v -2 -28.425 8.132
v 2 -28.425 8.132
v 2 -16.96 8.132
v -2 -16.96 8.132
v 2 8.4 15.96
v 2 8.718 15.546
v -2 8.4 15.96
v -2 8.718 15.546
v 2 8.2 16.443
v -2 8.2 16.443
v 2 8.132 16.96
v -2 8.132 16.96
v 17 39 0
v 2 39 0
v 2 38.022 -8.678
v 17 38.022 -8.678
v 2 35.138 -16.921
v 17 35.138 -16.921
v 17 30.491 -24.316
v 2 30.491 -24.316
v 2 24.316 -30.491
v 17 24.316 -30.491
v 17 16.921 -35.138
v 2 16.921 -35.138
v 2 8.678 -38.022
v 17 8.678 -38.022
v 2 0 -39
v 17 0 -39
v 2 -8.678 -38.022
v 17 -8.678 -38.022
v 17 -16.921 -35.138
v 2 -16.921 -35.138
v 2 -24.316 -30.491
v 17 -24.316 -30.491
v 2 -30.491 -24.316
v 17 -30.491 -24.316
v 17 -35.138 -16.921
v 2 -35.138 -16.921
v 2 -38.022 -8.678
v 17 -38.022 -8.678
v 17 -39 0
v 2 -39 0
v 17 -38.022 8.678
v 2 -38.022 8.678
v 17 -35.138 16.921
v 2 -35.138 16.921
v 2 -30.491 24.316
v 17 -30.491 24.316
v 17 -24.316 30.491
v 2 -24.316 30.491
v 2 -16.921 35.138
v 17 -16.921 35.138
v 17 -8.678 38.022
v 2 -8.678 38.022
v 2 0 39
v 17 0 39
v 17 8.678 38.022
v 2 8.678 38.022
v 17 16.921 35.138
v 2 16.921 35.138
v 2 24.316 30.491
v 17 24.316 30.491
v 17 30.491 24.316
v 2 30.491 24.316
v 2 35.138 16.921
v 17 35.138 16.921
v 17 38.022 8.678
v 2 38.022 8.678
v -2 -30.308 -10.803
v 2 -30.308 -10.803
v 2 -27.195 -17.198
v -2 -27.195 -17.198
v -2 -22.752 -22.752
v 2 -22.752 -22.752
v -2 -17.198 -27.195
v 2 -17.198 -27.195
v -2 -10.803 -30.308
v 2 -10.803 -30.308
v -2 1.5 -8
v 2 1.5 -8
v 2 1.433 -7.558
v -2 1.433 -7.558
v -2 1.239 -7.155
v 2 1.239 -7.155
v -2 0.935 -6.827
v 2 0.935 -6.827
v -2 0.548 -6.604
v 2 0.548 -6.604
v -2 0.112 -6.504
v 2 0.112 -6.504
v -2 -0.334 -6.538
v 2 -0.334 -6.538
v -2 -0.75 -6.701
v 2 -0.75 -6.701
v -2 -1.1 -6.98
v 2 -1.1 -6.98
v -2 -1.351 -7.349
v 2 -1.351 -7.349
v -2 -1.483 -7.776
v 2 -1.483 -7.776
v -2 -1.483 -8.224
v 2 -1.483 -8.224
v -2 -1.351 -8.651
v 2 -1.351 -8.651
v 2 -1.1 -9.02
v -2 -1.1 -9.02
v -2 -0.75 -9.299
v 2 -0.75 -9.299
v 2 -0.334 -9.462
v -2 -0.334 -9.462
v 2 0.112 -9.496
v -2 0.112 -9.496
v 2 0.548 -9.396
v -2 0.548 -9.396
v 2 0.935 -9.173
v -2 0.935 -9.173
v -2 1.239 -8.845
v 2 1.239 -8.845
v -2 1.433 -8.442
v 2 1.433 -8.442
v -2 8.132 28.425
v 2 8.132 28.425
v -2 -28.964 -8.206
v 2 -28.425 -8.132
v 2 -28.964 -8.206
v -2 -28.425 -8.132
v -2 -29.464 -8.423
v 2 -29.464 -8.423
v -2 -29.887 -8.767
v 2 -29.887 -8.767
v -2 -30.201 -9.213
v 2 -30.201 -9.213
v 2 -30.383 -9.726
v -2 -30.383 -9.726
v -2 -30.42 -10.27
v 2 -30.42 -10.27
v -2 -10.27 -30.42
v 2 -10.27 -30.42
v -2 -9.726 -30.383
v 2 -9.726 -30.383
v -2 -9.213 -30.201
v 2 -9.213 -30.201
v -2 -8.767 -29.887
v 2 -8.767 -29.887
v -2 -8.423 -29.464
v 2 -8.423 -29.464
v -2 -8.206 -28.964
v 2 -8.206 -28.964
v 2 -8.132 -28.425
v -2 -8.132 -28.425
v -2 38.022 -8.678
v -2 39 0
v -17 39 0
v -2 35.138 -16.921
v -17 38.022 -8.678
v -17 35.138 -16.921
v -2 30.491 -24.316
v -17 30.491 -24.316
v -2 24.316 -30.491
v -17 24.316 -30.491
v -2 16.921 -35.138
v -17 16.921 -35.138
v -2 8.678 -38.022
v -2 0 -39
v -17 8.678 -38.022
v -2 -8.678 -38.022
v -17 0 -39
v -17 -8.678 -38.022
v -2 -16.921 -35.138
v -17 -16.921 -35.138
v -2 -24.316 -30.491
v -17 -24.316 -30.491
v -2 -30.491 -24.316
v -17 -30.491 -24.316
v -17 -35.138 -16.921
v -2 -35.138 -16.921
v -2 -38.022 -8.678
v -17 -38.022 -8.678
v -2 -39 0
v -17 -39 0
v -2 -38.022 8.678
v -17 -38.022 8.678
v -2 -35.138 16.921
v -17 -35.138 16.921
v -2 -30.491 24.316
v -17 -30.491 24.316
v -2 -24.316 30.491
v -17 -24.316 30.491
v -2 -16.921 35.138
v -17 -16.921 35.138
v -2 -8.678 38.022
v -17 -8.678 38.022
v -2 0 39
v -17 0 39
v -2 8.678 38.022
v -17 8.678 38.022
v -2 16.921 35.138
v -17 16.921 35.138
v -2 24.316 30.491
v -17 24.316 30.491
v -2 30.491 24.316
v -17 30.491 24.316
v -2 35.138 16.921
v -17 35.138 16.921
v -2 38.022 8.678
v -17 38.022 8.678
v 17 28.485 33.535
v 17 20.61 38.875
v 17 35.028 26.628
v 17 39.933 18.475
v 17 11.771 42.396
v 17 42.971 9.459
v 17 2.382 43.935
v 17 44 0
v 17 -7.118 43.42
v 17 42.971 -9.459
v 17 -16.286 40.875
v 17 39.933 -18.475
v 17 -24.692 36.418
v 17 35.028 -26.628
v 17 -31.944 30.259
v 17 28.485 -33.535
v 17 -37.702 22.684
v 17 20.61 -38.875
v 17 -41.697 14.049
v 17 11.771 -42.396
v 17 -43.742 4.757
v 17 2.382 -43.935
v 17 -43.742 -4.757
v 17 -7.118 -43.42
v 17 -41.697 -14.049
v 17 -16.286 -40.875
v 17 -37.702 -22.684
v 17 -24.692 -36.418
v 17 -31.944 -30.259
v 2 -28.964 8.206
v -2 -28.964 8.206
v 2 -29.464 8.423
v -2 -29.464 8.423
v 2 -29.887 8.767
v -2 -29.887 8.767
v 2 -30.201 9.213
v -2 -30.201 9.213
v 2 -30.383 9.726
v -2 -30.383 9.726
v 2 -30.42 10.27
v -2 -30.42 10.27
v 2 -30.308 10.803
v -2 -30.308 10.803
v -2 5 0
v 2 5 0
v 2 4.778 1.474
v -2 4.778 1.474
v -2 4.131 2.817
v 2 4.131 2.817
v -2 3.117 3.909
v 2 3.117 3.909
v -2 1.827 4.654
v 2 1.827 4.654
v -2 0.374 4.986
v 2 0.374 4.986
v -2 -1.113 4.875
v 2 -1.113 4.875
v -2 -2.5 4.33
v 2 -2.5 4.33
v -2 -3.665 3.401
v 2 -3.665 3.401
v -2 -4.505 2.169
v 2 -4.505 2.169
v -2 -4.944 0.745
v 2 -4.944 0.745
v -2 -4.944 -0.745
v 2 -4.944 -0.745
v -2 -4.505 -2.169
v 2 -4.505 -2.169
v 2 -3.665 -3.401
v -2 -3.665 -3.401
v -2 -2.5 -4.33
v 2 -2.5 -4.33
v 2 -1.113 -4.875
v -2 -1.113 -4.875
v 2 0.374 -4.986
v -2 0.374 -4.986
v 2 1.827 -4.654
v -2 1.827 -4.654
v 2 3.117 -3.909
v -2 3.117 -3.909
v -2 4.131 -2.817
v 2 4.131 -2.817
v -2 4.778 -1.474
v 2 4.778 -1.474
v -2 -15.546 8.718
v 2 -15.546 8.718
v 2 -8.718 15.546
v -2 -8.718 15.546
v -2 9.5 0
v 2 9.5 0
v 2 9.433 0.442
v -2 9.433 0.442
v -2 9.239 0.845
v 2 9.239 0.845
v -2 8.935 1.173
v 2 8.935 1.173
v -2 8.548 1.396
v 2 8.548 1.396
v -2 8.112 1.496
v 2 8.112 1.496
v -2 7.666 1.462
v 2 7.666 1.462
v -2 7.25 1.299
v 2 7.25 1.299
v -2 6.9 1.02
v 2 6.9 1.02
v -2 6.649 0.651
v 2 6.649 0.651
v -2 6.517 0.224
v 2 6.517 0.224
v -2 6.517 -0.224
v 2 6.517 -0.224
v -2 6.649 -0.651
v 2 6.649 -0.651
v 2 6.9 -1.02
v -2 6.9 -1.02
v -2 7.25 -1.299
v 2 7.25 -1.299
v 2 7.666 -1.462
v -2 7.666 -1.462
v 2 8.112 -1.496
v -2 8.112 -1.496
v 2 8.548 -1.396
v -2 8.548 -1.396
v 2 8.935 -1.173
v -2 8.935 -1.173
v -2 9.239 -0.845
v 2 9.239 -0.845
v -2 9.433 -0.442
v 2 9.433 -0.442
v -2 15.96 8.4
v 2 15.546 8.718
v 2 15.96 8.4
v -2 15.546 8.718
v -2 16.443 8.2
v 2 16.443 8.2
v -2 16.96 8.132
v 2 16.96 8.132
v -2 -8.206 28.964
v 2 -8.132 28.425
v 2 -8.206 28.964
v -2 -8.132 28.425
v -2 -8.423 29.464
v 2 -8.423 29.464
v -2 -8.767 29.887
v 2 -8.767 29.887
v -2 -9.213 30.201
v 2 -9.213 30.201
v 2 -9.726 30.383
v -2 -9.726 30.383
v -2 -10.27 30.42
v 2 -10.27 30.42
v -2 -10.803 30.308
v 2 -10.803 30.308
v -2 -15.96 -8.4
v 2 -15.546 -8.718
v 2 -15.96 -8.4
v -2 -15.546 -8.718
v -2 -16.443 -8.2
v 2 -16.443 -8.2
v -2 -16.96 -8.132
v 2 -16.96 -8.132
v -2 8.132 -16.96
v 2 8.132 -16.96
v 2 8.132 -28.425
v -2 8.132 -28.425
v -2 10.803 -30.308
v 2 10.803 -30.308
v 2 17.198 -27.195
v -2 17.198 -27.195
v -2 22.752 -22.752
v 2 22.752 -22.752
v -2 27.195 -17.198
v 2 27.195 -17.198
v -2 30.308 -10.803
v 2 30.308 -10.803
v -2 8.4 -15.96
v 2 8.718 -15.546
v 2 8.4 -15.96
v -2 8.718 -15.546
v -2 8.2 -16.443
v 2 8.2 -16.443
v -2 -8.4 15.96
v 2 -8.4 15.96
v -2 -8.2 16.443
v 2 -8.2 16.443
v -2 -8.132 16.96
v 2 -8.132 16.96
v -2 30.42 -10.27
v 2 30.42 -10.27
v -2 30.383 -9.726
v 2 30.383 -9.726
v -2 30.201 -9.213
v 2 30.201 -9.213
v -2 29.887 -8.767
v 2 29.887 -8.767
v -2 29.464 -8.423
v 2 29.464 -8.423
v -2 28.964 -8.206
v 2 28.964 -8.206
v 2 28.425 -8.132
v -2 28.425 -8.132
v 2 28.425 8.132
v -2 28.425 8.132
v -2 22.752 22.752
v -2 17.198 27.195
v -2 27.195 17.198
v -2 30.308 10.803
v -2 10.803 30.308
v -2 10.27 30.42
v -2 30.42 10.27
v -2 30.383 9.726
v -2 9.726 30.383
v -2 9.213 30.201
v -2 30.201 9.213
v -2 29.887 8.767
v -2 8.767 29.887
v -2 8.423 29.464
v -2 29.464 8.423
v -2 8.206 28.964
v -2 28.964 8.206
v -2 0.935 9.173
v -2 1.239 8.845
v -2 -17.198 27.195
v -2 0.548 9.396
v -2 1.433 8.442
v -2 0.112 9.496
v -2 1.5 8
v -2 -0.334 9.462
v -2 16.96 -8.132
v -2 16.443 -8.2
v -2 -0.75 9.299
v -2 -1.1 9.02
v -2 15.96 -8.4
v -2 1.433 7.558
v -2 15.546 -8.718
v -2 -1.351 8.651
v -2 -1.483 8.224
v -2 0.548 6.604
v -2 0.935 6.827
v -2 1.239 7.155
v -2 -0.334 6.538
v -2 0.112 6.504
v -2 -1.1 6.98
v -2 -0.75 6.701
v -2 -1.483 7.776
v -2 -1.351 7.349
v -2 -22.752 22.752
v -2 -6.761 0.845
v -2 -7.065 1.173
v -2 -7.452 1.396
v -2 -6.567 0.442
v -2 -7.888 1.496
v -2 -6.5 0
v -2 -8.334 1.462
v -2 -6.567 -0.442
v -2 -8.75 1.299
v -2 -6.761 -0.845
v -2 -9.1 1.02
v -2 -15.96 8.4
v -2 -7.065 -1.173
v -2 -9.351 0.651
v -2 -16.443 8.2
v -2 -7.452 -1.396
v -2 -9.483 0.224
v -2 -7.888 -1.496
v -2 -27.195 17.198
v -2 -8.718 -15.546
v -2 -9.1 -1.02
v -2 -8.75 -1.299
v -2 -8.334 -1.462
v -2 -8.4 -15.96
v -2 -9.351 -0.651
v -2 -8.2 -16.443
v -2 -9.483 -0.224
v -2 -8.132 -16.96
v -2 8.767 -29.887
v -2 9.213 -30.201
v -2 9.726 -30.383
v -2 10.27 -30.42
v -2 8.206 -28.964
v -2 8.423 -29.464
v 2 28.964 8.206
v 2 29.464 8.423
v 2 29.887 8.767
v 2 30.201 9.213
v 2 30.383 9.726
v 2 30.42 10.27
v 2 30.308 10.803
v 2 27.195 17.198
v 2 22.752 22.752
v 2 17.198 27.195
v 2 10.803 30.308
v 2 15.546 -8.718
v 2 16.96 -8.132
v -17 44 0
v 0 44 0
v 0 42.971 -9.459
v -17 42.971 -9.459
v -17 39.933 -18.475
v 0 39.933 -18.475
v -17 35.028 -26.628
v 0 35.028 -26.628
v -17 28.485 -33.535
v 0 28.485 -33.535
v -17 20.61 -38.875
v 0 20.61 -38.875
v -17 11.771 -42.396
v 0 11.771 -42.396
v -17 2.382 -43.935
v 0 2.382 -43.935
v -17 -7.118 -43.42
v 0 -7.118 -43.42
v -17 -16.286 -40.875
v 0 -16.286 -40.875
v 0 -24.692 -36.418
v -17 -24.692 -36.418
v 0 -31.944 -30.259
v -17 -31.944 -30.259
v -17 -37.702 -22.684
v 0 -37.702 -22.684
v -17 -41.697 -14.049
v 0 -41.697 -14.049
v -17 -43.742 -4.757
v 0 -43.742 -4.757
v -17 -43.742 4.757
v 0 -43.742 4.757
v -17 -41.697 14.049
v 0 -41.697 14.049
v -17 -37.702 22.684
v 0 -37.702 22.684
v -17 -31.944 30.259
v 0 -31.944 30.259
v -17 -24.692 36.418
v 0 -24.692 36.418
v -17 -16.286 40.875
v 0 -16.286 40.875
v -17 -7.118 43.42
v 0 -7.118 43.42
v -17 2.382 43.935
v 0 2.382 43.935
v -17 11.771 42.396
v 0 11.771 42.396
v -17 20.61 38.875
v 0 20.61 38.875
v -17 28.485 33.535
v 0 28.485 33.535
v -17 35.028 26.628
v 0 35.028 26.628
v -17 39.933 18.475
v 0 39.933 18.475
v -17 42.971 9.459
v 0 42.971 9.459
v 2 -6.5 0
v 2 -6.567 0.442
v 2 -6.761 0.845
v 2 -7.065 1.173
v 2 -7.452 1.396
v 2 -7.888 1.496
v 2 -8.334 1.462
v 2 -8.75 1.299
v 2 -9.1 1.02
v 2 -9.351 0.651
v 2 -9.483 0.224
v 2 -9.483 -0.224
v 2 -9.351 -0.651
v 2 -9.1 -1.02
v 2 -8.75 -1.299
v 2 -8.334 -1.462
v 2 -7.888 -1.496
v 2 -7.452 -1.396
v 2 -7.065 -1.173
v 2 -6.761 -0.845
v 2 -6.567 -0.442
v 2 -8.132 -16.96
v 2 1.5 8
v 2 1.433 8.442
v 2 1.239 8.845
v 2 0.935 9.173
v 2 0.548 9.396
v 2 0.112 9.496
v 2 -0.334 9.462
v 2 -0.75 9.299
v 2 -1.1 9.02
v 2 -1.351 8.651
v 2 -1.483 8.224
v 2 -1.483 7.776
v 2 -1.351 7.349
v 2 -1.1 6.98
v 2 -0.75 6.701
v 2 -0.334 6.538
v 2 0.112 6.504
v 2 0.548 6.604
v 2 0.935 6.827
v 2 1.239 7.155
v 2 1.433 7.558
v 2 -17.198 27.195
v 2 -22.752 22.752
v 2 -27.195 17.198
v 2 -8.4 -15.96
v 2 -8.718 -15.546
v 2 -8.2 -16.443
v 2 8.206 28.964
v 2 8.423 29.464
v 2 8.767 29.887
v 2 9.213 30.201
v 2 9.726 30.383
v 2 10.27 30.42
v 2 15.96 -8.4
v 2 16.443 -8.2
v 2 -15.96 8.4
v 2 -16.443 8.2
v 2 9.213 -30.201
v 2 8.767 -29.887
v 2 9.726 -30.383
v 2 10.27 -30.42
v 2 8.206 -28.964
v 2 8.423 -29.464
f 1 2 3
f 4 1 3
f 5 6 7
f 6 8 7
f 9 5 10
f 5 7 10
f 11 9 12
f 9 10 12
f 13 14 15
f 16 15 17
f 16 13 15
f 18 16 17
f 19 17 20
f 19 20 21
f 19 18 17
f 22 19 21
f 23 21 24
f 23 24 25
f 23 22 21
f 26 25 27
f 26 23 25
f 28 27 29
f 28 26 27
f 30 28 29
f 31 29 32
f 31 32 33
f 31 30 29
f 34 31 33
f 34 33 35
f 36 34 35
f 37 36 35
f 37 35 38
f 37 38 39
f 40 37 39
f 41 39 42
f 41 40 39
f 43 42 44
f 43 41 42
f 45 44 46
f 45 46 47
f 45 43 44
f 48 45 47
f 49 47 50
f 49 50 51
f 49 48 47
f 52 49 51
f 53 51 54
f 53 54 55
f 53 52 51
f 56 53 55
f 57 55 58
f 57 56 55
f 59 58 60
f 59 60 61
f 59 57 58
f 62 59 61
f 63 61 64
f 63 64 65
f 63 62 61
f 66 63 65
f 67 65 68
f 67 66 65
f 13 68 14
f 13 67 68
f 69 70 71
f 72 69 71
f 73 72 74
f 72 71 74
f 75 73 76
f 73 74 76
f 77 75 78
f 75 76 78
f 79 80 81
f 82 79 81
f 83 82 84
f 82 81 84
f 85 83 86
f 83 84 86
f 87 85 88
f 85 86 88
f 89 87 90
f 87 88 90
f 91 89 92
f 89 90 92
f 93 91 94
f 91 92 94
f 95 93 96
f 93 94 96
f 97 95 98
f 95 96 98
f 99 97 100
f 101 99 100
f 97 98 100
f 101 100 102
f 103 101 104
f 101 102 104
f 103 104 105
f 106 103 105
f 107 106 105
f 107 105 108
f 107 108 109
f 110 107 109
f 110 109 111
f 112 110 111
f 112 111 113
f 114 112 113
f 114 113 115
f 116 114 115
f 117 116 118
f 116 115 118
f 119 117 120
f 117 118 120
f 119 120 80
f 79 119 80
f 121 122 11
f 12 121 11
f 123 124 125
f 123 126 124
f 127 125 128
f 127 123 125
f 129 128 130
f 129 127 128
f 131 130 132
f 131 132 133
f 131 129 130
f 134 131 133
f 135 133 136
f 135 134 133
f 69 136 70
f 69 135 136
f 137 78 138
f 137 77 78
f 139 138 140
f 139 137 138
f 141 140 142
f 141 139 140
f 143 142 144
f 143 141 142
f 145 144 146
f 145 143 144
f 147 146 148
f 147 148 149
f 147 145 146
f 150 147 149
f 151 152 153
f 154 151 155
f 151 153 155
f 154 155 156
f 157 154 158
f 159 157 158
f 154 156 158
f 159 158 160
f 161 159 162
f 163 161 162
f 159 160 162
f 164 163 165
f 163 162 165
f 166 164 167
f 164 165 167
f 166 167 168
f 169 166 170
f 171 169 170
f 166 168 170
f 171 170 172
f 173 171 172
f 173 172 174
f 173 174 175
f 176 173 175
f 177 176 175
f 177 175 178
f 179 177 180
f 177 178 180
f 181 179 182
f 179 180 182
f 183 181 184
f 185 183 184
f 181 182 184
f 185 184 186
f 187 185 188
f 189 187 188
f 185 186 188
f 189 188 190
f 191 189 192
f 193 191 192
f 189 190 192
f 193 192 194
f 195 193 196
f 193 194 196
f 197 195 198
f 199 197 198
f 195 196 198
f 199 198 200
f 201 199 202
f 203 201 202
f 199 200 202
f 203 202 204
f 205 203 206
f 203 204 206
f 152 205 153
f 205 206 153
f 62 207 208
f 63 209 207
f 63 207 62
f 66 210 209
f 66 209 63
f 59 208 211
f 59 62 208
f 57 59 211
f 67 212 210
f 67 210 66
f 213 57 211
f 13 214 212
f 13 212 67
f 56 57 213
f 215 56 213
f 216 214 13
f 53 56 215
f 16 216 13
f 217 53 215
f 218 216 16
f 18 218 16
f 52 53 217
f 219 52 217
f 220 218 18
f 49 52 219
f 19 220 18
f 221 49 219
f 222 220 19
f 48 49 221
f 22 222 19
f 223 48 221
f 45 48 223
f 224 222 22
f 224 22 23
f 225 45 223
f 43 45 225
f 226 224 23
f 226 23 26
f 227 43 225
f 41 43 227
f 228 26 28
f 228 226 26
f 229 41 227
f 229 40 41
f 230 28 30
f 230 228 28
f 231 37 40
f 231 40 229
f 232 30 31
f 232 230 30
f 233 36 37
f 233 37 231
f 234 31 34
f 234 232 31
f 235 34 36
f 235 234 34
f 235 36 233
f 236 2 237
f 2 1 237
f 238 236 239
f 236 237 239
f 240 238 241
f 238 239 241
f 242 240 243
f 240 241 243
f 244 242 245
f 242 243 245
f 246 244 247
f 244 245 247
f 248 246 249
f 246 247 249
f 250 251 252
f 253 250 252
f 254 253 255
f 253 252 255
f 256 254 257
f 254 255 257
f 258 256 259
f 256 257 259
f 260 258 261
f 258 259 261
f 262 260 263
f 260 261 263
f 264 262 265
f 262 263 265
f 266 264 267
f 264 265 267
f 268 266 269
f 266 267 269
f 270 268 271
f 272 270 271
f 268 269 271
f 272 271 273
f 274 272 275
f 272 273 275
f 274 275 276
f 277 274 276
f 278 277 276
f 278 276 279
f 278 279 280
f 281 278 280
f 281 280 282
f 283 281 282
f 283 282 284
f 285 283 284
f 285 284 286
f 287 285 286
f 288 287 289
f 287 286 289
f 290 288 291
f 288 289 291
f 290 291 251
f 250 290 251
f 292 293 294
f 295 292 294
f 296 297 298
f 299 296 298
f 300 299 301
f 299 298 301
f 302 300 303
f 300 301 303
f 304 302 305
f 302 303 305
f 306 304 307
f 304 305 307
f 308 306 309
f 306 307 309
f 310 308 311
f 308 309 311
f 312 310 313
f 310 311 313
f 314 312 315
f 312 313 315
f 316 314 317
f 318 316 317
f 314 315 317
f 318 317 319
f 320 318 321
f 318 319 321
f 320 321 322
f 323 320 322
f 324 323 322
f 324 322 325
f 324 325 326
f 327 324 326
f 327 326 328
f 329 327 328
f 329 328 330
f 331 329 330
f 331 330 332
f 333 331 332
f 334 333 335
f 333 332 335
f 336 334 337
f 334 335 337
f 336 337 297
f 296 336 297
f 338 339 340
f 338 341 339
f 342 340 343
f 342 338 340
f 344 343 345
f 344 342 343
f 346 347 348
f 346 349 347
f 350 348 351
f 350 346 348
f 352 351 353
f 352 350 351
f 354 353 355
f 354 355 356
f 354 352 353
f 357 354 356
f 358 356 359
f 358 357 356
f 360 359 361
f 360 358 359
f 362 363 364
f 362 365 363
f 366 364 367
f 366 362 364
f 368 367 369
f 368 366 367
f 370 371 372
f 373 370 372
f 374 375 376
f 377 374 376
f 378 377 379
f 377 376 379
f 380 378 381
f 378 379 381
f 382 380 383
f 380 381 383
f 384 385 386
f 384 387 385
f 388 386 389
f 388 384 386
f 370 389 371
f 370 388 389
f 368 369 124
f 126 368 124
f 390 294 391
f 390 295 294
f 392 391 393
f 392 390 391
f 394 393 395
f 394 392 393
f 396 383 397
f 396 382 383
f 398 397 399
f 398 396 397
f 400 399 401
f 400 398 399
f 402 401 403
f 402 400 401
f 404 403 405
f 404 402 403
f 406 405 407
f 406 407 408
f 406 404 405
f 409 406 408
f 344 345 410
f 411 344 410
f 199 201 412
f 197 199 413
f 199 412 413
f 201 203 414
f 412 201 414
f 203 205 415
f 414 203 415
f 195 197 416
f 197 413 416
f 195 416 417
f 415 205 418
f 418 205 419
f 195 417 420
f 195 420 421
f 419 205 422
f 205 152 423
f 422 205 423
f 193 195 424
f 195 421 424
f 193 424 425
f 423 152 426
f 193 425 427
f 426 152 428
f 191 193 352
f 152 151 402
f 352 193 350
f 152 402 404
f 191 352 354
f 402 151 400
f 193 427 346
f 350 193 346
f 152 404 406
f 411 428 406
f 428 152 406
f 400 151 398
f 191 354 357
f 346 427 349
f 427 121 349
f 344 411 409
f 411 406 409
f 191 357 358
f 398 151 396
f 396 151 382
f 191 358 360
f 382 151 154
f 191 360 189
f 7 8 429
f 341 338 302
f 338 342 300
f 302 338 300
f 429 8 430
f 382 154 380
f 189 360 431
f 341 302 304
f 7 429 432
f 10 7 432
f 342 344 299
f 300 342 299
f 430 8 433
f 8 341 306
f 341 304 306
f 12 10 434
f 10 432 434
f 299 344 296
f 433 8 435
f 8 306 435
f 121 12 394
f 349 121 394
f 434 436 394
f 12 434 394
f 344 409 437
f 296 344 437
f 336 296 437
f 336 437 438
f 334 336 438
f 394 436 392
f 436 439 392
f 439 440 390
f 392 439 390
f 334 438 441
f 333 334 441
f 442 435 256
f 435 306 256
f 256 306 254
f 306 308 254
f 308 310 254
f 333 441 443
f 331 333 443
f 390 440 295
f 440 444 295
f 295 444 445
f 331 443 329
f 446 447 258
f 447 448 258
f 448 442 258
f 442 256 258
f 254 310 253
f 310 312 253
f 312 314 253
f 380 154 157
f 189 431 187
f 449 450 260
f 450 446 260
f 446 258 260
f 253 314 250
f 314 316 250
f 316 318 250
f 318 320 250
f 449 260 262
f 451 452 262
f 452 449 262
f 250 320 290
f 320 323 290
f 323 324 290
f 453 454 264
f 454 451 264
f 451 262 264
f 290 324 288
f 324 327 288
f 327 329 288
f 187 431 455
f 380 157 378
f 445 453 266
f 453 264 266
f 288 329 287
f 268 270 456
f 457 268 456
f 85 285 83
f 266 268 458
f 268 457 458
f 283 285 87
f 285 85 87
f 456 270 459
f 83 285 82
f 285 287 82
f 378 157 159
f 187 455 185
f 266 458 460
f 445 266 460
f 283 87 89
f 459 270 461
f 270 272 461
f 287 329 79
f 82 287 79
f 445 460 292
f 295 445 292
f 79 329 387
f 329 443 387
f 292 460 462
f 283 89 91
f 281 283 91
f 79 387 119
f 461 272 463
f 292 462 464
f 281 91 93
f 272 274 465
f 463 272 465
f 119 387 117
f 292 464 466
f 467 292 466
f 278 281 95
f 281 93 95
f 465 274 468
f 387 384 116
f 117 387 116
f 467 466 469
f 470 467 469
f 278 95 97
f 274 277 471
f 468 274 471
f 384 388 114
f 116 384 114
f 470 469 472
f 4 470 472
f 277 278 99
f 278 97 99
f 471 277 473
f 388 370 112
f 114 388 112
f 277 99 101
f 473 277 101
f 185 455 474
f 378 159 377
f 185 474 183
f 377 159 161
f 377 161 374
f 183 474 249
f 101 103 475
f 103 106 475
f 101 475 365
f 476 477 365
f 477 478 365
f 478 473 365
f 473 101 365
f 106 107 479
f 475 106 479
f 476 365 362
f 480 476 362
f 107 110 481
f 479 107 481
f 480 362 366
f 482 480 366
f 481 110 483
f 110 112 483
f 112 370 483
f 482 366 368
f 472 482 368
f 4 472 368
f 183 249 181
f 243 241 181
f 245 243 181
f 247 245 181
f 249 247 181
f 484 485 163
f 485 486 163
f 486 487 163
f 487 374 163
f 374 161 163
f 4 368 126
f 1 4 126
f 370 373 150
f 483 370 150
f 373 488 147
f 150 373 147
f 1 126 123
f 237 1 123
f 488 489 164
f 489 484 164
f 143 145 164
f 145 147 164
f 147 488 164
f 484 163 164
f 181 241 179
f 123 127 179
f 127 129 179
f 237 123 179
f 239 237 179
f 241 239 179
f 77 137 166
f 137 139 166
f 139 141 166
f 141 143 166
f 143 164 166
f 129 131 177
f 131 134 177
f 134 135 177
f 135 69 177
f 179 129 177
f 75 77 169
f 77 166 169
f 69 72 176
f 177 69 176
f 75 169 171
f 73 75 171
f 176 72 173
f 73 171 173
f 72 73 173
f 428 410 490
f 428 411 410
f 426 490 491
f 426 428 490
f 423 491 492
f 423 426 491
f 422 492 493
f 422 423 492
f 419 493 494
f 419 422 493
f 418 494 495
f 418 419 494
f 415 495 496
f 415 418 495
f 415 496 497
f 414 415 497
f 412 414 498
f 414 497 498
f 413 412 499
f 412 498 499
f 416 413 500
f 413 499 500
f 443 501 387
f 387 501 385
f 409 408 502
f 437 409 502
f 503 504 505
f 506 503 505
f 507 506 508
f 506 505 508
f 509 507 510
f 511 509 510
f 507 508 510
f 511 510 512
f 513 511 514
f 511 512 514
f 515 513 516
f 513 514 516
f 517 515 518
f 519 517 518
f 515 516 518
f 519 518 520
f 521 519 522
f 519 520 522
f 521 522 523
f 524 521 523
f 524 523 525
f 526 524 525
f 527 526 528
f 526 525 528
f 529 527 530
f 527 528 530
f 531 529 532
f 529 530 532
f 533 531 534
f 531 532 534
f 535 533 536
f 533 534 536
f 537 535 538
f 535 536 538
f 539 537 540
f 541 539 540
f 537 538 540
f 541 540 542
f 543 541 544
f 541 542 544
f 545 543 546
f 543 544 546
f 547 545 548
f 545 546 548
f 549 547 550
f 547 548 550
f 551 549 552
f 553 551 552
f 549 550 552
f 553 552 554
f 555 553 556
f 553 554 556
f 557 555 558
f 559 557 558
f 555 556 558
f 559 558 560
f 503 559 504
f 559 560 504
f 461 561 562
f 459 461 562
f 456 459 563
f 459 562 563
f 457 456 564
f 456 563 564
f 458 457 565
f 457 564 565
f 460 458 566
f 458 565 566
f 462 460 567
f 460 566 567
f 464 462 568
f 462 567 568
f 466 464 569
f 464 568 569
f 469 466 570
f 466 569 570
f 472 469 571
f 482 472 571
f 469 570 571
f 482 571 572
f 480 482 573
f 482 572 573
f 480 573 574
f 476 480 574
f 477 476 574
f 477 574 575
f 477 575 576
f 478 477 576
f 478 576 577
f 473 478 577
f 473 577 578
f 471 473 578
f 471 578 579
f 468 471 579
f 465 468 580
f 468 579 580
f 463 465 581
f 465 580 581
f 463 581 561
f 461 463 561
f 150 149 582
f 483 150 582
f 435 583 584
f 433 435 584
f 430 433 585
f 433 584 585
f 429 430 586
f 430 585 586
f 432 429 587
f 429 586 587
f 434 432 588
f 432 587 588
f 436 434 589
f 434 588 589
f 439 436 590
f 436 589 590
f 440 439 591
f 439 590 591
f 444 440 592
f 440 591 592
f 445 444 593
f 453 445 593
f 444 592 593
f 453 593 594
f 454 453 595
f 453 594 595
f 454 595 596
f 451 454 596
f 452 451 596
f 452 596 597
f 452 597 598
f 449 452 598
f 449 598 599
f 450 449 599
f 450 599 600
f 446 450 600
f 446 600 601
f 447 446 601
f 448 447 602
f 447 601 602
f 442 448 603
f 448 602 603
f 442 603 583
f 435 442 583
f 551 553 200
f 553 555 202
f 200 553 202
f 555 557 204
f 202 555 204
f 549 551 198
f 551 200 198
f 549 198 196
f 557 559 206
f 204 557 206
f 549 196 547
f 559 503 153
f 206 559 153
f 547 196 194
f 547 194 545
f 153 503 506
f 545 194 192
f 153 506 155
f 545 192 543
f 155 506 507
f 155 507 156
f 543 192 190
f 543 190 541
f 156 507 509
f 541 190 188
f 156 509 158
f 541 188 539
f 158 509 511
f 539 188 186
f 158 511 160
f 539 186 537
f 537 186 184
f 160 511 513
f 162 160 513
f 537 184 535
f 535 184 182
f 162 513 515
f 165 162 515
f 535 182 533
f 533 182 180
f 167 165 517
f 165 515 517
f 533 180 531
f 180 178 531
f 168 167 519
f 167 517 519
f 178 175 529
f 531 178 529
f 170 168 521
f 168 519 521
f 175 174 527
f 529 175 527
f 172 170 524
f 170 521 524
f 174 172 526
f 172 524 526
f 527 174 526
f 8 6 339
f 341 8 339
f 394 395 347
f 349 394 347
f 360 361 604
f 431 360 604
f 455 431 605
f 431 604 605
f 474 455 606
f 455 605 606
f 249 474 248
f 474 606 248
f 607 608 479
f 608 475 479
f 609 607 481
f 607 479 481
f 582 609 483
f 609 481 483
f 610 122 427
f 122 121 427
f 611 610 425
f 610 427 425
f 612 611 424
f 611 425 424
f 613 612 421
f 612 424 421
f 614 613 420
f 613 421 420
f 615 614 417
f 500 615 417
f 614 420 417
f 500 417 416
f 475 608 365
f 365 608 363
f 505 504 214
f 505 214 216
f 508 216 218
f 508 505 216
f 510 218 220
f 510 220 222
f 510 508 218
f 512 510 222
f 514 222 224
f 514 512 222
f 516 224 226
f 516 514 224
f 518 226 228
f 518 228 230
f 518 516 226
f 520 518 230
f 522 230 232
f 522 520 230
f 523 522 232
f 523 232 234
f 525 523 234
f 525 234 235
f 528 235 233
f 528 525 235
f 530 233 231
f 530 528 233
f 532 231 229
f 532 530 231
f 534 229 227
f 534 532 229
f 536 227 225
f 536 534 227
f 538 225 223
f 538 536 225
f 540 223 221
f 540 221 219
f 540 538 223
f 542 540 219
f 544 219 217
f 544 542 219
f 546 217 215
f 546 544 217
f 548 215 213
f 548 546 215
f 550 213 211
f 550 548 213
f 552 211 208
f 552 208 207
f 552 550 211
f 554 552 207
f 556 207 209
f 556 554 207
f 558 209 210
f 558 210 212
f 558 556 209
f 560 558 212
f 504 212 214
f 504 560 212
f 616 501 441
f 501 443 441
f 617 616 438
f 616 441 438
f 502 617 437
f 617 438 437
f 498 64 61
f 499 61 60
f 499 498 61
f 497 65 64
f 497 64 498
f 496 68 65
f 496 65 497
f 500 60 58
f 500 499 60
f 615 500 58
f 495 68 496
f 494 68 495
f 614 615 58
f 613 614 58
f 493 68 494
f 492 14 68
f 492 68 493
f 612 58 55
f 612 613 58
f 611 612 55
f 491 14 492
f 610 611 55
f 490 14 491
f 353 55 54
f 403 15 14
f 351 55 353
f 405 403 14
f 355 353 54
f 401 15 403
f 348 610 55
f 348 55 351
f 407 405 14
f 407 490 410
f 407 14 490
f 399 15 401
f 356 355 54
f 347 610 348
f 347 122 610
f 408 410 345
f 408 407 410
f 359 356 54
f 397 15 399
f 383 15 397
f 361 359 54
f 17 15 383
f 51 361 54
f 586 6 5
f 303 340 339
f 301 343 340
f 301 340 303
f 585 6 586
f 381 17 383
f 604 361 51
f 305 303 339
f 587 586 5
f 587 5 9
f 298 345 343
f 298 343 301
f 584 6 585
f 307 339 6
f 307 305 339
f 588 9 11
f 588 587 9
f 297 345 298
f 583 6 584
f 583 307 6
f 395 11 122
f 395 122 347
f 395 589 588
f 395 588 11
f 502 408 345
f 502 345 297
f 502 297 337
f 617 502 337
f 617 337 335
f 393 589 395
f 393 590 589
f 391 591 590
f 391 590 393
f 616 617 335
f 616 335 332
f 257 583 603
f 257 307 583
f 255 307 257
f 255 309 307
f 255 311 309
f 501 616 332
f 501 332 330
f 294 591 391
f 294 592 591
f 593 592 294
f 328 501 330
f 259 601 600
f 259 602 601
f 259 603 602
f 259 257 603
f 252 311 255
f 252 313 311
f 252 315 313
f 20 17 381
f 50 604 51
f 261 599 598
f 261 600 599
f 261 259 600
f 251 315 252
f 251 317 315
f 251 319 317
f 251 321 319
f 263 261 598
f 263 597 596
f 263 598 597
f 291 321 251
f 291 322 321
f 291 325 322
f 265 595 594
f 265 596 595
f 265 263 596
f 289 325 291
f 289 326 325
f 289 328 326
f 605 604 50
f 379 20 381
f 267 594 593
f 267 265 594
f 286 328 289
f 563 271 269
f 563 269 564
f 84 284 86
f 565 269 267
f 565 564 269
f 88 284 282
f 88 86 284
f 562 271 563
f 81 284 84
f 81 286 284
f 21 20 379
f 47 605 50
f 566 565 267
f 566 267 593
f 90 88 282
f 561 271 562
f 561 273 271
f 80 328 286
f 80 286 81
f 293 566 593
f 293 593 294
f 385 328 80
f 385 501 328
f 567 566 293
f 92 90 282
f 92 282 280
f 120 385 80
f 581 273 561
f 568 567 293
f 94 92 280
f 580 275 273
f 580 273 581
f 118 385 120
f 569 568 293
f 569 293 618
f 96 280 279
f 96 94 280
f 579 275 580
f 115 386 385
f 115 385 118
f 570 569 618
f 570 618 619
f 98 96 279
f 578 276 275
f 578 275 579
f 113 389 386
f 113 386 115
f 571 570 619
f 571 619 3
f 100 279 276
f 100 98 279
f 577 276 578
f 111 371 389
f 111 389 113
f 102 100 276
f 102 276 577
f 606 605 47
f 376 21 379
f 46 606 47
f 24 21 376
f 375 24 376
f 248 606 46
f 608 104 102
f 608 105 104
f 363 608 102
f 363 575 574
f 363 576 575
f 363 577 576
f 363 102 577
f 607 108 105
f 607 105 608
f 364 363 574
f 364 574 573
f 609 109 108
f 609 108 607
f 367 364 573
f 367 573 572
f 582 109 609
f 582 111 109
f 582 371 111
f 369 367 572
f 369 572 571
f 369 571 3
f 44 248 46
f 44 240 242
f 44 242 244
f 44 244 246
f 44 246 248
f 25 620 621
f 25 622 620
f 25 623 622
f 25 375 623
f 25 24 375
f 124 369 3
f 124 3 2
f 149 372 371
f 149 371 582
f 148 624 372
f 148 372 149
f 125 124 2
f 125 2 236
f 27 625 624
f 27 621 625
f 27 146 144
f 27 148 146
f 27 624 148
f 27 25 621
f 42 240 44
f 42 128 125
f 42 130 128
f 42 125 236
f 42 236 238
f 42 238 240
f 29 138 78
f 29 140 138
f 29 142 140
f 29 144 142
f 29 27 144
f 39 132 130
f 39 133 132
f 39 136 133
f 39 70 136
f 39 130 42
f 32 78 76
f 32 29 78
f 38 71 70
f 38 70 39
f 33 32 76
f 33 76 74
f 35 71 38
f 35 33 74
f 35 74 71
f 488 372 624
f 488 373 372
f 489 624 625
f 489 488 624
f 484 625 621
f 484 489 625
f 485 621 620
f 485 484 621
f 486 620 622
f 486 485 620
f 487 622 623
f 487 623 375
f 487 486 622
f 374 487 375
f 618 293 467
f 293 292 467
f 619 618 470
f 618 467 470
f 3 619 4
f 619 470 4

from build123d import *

# Parameters (mm, degrees)
SKETCH2_R                = 5
SKETCH2_R_2              = 1.5
HOLES_DEPTH              = 4
SPOKES_DEPTH             = 4
FILLET2_R                = 2
CIRPATTERN2_COUNT        = 4
FILLET2_OF_CIRPATTERN2_R = 2


with BuildPart() as part:
    # Sketch1 → Revolve1 (revolve)
    with BuildSketch(Plane.XY):
        Polygon((2, 0), (2, 39), (17, 39), (17, 44), (0, 44), (0, 0), align=None)
    revolve1 = revolve(axis=Axis((2, 0, 0), (-1, 0, 0)))

    # Mirror1: Revolve1 across plane
    add(revolve1.mirror(Plane.ZY))

    # Sketch2 → holes (cut)
    with BuildSketch(Plane(origin=(2, 0, 0), x_dir=(0, 0, -1), z_dir=(1, 0, 0))):
        with Locations(Location((0, 0, 0), (0, 0, 90))):
            Circle(SKETCH2_R)
        with Locations(Location((8, 0, 0), (0, 0, 90))):
            Circle(SKETCH2_R_2)
        with Locations(Location((0, -8, 0), (0, 0, 90))):
            Circle(SKETCH2_R_2)
        with Locations(Location((-8, 0, 0), (0, 0, 90))):
            Circle(SKETCH2_R_2)
        with Locations(Location((0, 8, 0), (0, 0, 90))):
            Circle(SKETCH2_R_2)
    extrude(amount=-HOLES_DEPTH, mode=Mode.SUBTRACT)

    # Sketch3 → spokes (cut)
    with BuildSketch(Plane(origin=(2, 0, 0), x_dir=(0, 0, -1), z_dir=(1, 0, 0))):
        with BuildLine():
            Line((8.131727984, 16.131727984), (16.131727984, 8.131727984))
            Line((16.131727984, 8.131727984), (31.131727984, 8.131727984))
            ThreePointArc((31.131727984, 8.131727984), (22.752027242, 22.752027242), (8.131727984, 31.131727984))
            Line((8.131727984, 31.131727984), (8.131727984, 16.131727984))
        make_face()
    spokes = extrude(amount=-SPOKES_DEPTH, mode=Mode.SUBTRACT)

    # Fillet2
    fillet2_edges = [part.edges().sort_by_distance(p)[0] for p in [
        (0, 16.131727984, -8.131727984),
        (0, 8.131727984, -16.131727984),
        (0, 8.131727984, -31.131727984),
        (0, 31.131727984, -8.131727984),
    ]]
    fillet(fillet2_edges, radius=FILLET2_R)

    # CirPattern2: spokes ×4 about axis
    cirpattern2_axis = Axis((0, 0, 0), (1, 0, 0))
    for i in range(1, CIRPATTERN2_COUNT):
        add(spokes.rotate(cirpattern2_axis, i * 360 / CIRPATTERN2_COUNT), mode=Mode.SUBTRACT)

    # Fillet2 of CirPattern2
    fillet2_of_cirpattern2_edges = [part.edges().sort_by_distance(p)[0] for p in [
        (0, 8.131727984, 16.131727984),
        (0, 16.131727984, 8.131727984),
        (0, 31.131727984, 8.131727984),
        (0, 8.131727984, 31.131727984),
        (0, -16.131727984, 8.131727984),
        (0, -8.131727984, 16.131727984),
        (0, -8.131727984, 31.131727984),
        (0, -31.131727984, 8.131727984),
        (0, -8.131727984, -16.131727984),
        (0, -16.131727984, -8.131727984),
        (0, -31.131727984, -8.131727984),
        (0, -8.131727984, -31.131727984),
    ]]
    fillet(fillet2_of_cirpattern2_edges, radius=FILLET2_OF_CIRPATTERN2_R)


solid = part.part
